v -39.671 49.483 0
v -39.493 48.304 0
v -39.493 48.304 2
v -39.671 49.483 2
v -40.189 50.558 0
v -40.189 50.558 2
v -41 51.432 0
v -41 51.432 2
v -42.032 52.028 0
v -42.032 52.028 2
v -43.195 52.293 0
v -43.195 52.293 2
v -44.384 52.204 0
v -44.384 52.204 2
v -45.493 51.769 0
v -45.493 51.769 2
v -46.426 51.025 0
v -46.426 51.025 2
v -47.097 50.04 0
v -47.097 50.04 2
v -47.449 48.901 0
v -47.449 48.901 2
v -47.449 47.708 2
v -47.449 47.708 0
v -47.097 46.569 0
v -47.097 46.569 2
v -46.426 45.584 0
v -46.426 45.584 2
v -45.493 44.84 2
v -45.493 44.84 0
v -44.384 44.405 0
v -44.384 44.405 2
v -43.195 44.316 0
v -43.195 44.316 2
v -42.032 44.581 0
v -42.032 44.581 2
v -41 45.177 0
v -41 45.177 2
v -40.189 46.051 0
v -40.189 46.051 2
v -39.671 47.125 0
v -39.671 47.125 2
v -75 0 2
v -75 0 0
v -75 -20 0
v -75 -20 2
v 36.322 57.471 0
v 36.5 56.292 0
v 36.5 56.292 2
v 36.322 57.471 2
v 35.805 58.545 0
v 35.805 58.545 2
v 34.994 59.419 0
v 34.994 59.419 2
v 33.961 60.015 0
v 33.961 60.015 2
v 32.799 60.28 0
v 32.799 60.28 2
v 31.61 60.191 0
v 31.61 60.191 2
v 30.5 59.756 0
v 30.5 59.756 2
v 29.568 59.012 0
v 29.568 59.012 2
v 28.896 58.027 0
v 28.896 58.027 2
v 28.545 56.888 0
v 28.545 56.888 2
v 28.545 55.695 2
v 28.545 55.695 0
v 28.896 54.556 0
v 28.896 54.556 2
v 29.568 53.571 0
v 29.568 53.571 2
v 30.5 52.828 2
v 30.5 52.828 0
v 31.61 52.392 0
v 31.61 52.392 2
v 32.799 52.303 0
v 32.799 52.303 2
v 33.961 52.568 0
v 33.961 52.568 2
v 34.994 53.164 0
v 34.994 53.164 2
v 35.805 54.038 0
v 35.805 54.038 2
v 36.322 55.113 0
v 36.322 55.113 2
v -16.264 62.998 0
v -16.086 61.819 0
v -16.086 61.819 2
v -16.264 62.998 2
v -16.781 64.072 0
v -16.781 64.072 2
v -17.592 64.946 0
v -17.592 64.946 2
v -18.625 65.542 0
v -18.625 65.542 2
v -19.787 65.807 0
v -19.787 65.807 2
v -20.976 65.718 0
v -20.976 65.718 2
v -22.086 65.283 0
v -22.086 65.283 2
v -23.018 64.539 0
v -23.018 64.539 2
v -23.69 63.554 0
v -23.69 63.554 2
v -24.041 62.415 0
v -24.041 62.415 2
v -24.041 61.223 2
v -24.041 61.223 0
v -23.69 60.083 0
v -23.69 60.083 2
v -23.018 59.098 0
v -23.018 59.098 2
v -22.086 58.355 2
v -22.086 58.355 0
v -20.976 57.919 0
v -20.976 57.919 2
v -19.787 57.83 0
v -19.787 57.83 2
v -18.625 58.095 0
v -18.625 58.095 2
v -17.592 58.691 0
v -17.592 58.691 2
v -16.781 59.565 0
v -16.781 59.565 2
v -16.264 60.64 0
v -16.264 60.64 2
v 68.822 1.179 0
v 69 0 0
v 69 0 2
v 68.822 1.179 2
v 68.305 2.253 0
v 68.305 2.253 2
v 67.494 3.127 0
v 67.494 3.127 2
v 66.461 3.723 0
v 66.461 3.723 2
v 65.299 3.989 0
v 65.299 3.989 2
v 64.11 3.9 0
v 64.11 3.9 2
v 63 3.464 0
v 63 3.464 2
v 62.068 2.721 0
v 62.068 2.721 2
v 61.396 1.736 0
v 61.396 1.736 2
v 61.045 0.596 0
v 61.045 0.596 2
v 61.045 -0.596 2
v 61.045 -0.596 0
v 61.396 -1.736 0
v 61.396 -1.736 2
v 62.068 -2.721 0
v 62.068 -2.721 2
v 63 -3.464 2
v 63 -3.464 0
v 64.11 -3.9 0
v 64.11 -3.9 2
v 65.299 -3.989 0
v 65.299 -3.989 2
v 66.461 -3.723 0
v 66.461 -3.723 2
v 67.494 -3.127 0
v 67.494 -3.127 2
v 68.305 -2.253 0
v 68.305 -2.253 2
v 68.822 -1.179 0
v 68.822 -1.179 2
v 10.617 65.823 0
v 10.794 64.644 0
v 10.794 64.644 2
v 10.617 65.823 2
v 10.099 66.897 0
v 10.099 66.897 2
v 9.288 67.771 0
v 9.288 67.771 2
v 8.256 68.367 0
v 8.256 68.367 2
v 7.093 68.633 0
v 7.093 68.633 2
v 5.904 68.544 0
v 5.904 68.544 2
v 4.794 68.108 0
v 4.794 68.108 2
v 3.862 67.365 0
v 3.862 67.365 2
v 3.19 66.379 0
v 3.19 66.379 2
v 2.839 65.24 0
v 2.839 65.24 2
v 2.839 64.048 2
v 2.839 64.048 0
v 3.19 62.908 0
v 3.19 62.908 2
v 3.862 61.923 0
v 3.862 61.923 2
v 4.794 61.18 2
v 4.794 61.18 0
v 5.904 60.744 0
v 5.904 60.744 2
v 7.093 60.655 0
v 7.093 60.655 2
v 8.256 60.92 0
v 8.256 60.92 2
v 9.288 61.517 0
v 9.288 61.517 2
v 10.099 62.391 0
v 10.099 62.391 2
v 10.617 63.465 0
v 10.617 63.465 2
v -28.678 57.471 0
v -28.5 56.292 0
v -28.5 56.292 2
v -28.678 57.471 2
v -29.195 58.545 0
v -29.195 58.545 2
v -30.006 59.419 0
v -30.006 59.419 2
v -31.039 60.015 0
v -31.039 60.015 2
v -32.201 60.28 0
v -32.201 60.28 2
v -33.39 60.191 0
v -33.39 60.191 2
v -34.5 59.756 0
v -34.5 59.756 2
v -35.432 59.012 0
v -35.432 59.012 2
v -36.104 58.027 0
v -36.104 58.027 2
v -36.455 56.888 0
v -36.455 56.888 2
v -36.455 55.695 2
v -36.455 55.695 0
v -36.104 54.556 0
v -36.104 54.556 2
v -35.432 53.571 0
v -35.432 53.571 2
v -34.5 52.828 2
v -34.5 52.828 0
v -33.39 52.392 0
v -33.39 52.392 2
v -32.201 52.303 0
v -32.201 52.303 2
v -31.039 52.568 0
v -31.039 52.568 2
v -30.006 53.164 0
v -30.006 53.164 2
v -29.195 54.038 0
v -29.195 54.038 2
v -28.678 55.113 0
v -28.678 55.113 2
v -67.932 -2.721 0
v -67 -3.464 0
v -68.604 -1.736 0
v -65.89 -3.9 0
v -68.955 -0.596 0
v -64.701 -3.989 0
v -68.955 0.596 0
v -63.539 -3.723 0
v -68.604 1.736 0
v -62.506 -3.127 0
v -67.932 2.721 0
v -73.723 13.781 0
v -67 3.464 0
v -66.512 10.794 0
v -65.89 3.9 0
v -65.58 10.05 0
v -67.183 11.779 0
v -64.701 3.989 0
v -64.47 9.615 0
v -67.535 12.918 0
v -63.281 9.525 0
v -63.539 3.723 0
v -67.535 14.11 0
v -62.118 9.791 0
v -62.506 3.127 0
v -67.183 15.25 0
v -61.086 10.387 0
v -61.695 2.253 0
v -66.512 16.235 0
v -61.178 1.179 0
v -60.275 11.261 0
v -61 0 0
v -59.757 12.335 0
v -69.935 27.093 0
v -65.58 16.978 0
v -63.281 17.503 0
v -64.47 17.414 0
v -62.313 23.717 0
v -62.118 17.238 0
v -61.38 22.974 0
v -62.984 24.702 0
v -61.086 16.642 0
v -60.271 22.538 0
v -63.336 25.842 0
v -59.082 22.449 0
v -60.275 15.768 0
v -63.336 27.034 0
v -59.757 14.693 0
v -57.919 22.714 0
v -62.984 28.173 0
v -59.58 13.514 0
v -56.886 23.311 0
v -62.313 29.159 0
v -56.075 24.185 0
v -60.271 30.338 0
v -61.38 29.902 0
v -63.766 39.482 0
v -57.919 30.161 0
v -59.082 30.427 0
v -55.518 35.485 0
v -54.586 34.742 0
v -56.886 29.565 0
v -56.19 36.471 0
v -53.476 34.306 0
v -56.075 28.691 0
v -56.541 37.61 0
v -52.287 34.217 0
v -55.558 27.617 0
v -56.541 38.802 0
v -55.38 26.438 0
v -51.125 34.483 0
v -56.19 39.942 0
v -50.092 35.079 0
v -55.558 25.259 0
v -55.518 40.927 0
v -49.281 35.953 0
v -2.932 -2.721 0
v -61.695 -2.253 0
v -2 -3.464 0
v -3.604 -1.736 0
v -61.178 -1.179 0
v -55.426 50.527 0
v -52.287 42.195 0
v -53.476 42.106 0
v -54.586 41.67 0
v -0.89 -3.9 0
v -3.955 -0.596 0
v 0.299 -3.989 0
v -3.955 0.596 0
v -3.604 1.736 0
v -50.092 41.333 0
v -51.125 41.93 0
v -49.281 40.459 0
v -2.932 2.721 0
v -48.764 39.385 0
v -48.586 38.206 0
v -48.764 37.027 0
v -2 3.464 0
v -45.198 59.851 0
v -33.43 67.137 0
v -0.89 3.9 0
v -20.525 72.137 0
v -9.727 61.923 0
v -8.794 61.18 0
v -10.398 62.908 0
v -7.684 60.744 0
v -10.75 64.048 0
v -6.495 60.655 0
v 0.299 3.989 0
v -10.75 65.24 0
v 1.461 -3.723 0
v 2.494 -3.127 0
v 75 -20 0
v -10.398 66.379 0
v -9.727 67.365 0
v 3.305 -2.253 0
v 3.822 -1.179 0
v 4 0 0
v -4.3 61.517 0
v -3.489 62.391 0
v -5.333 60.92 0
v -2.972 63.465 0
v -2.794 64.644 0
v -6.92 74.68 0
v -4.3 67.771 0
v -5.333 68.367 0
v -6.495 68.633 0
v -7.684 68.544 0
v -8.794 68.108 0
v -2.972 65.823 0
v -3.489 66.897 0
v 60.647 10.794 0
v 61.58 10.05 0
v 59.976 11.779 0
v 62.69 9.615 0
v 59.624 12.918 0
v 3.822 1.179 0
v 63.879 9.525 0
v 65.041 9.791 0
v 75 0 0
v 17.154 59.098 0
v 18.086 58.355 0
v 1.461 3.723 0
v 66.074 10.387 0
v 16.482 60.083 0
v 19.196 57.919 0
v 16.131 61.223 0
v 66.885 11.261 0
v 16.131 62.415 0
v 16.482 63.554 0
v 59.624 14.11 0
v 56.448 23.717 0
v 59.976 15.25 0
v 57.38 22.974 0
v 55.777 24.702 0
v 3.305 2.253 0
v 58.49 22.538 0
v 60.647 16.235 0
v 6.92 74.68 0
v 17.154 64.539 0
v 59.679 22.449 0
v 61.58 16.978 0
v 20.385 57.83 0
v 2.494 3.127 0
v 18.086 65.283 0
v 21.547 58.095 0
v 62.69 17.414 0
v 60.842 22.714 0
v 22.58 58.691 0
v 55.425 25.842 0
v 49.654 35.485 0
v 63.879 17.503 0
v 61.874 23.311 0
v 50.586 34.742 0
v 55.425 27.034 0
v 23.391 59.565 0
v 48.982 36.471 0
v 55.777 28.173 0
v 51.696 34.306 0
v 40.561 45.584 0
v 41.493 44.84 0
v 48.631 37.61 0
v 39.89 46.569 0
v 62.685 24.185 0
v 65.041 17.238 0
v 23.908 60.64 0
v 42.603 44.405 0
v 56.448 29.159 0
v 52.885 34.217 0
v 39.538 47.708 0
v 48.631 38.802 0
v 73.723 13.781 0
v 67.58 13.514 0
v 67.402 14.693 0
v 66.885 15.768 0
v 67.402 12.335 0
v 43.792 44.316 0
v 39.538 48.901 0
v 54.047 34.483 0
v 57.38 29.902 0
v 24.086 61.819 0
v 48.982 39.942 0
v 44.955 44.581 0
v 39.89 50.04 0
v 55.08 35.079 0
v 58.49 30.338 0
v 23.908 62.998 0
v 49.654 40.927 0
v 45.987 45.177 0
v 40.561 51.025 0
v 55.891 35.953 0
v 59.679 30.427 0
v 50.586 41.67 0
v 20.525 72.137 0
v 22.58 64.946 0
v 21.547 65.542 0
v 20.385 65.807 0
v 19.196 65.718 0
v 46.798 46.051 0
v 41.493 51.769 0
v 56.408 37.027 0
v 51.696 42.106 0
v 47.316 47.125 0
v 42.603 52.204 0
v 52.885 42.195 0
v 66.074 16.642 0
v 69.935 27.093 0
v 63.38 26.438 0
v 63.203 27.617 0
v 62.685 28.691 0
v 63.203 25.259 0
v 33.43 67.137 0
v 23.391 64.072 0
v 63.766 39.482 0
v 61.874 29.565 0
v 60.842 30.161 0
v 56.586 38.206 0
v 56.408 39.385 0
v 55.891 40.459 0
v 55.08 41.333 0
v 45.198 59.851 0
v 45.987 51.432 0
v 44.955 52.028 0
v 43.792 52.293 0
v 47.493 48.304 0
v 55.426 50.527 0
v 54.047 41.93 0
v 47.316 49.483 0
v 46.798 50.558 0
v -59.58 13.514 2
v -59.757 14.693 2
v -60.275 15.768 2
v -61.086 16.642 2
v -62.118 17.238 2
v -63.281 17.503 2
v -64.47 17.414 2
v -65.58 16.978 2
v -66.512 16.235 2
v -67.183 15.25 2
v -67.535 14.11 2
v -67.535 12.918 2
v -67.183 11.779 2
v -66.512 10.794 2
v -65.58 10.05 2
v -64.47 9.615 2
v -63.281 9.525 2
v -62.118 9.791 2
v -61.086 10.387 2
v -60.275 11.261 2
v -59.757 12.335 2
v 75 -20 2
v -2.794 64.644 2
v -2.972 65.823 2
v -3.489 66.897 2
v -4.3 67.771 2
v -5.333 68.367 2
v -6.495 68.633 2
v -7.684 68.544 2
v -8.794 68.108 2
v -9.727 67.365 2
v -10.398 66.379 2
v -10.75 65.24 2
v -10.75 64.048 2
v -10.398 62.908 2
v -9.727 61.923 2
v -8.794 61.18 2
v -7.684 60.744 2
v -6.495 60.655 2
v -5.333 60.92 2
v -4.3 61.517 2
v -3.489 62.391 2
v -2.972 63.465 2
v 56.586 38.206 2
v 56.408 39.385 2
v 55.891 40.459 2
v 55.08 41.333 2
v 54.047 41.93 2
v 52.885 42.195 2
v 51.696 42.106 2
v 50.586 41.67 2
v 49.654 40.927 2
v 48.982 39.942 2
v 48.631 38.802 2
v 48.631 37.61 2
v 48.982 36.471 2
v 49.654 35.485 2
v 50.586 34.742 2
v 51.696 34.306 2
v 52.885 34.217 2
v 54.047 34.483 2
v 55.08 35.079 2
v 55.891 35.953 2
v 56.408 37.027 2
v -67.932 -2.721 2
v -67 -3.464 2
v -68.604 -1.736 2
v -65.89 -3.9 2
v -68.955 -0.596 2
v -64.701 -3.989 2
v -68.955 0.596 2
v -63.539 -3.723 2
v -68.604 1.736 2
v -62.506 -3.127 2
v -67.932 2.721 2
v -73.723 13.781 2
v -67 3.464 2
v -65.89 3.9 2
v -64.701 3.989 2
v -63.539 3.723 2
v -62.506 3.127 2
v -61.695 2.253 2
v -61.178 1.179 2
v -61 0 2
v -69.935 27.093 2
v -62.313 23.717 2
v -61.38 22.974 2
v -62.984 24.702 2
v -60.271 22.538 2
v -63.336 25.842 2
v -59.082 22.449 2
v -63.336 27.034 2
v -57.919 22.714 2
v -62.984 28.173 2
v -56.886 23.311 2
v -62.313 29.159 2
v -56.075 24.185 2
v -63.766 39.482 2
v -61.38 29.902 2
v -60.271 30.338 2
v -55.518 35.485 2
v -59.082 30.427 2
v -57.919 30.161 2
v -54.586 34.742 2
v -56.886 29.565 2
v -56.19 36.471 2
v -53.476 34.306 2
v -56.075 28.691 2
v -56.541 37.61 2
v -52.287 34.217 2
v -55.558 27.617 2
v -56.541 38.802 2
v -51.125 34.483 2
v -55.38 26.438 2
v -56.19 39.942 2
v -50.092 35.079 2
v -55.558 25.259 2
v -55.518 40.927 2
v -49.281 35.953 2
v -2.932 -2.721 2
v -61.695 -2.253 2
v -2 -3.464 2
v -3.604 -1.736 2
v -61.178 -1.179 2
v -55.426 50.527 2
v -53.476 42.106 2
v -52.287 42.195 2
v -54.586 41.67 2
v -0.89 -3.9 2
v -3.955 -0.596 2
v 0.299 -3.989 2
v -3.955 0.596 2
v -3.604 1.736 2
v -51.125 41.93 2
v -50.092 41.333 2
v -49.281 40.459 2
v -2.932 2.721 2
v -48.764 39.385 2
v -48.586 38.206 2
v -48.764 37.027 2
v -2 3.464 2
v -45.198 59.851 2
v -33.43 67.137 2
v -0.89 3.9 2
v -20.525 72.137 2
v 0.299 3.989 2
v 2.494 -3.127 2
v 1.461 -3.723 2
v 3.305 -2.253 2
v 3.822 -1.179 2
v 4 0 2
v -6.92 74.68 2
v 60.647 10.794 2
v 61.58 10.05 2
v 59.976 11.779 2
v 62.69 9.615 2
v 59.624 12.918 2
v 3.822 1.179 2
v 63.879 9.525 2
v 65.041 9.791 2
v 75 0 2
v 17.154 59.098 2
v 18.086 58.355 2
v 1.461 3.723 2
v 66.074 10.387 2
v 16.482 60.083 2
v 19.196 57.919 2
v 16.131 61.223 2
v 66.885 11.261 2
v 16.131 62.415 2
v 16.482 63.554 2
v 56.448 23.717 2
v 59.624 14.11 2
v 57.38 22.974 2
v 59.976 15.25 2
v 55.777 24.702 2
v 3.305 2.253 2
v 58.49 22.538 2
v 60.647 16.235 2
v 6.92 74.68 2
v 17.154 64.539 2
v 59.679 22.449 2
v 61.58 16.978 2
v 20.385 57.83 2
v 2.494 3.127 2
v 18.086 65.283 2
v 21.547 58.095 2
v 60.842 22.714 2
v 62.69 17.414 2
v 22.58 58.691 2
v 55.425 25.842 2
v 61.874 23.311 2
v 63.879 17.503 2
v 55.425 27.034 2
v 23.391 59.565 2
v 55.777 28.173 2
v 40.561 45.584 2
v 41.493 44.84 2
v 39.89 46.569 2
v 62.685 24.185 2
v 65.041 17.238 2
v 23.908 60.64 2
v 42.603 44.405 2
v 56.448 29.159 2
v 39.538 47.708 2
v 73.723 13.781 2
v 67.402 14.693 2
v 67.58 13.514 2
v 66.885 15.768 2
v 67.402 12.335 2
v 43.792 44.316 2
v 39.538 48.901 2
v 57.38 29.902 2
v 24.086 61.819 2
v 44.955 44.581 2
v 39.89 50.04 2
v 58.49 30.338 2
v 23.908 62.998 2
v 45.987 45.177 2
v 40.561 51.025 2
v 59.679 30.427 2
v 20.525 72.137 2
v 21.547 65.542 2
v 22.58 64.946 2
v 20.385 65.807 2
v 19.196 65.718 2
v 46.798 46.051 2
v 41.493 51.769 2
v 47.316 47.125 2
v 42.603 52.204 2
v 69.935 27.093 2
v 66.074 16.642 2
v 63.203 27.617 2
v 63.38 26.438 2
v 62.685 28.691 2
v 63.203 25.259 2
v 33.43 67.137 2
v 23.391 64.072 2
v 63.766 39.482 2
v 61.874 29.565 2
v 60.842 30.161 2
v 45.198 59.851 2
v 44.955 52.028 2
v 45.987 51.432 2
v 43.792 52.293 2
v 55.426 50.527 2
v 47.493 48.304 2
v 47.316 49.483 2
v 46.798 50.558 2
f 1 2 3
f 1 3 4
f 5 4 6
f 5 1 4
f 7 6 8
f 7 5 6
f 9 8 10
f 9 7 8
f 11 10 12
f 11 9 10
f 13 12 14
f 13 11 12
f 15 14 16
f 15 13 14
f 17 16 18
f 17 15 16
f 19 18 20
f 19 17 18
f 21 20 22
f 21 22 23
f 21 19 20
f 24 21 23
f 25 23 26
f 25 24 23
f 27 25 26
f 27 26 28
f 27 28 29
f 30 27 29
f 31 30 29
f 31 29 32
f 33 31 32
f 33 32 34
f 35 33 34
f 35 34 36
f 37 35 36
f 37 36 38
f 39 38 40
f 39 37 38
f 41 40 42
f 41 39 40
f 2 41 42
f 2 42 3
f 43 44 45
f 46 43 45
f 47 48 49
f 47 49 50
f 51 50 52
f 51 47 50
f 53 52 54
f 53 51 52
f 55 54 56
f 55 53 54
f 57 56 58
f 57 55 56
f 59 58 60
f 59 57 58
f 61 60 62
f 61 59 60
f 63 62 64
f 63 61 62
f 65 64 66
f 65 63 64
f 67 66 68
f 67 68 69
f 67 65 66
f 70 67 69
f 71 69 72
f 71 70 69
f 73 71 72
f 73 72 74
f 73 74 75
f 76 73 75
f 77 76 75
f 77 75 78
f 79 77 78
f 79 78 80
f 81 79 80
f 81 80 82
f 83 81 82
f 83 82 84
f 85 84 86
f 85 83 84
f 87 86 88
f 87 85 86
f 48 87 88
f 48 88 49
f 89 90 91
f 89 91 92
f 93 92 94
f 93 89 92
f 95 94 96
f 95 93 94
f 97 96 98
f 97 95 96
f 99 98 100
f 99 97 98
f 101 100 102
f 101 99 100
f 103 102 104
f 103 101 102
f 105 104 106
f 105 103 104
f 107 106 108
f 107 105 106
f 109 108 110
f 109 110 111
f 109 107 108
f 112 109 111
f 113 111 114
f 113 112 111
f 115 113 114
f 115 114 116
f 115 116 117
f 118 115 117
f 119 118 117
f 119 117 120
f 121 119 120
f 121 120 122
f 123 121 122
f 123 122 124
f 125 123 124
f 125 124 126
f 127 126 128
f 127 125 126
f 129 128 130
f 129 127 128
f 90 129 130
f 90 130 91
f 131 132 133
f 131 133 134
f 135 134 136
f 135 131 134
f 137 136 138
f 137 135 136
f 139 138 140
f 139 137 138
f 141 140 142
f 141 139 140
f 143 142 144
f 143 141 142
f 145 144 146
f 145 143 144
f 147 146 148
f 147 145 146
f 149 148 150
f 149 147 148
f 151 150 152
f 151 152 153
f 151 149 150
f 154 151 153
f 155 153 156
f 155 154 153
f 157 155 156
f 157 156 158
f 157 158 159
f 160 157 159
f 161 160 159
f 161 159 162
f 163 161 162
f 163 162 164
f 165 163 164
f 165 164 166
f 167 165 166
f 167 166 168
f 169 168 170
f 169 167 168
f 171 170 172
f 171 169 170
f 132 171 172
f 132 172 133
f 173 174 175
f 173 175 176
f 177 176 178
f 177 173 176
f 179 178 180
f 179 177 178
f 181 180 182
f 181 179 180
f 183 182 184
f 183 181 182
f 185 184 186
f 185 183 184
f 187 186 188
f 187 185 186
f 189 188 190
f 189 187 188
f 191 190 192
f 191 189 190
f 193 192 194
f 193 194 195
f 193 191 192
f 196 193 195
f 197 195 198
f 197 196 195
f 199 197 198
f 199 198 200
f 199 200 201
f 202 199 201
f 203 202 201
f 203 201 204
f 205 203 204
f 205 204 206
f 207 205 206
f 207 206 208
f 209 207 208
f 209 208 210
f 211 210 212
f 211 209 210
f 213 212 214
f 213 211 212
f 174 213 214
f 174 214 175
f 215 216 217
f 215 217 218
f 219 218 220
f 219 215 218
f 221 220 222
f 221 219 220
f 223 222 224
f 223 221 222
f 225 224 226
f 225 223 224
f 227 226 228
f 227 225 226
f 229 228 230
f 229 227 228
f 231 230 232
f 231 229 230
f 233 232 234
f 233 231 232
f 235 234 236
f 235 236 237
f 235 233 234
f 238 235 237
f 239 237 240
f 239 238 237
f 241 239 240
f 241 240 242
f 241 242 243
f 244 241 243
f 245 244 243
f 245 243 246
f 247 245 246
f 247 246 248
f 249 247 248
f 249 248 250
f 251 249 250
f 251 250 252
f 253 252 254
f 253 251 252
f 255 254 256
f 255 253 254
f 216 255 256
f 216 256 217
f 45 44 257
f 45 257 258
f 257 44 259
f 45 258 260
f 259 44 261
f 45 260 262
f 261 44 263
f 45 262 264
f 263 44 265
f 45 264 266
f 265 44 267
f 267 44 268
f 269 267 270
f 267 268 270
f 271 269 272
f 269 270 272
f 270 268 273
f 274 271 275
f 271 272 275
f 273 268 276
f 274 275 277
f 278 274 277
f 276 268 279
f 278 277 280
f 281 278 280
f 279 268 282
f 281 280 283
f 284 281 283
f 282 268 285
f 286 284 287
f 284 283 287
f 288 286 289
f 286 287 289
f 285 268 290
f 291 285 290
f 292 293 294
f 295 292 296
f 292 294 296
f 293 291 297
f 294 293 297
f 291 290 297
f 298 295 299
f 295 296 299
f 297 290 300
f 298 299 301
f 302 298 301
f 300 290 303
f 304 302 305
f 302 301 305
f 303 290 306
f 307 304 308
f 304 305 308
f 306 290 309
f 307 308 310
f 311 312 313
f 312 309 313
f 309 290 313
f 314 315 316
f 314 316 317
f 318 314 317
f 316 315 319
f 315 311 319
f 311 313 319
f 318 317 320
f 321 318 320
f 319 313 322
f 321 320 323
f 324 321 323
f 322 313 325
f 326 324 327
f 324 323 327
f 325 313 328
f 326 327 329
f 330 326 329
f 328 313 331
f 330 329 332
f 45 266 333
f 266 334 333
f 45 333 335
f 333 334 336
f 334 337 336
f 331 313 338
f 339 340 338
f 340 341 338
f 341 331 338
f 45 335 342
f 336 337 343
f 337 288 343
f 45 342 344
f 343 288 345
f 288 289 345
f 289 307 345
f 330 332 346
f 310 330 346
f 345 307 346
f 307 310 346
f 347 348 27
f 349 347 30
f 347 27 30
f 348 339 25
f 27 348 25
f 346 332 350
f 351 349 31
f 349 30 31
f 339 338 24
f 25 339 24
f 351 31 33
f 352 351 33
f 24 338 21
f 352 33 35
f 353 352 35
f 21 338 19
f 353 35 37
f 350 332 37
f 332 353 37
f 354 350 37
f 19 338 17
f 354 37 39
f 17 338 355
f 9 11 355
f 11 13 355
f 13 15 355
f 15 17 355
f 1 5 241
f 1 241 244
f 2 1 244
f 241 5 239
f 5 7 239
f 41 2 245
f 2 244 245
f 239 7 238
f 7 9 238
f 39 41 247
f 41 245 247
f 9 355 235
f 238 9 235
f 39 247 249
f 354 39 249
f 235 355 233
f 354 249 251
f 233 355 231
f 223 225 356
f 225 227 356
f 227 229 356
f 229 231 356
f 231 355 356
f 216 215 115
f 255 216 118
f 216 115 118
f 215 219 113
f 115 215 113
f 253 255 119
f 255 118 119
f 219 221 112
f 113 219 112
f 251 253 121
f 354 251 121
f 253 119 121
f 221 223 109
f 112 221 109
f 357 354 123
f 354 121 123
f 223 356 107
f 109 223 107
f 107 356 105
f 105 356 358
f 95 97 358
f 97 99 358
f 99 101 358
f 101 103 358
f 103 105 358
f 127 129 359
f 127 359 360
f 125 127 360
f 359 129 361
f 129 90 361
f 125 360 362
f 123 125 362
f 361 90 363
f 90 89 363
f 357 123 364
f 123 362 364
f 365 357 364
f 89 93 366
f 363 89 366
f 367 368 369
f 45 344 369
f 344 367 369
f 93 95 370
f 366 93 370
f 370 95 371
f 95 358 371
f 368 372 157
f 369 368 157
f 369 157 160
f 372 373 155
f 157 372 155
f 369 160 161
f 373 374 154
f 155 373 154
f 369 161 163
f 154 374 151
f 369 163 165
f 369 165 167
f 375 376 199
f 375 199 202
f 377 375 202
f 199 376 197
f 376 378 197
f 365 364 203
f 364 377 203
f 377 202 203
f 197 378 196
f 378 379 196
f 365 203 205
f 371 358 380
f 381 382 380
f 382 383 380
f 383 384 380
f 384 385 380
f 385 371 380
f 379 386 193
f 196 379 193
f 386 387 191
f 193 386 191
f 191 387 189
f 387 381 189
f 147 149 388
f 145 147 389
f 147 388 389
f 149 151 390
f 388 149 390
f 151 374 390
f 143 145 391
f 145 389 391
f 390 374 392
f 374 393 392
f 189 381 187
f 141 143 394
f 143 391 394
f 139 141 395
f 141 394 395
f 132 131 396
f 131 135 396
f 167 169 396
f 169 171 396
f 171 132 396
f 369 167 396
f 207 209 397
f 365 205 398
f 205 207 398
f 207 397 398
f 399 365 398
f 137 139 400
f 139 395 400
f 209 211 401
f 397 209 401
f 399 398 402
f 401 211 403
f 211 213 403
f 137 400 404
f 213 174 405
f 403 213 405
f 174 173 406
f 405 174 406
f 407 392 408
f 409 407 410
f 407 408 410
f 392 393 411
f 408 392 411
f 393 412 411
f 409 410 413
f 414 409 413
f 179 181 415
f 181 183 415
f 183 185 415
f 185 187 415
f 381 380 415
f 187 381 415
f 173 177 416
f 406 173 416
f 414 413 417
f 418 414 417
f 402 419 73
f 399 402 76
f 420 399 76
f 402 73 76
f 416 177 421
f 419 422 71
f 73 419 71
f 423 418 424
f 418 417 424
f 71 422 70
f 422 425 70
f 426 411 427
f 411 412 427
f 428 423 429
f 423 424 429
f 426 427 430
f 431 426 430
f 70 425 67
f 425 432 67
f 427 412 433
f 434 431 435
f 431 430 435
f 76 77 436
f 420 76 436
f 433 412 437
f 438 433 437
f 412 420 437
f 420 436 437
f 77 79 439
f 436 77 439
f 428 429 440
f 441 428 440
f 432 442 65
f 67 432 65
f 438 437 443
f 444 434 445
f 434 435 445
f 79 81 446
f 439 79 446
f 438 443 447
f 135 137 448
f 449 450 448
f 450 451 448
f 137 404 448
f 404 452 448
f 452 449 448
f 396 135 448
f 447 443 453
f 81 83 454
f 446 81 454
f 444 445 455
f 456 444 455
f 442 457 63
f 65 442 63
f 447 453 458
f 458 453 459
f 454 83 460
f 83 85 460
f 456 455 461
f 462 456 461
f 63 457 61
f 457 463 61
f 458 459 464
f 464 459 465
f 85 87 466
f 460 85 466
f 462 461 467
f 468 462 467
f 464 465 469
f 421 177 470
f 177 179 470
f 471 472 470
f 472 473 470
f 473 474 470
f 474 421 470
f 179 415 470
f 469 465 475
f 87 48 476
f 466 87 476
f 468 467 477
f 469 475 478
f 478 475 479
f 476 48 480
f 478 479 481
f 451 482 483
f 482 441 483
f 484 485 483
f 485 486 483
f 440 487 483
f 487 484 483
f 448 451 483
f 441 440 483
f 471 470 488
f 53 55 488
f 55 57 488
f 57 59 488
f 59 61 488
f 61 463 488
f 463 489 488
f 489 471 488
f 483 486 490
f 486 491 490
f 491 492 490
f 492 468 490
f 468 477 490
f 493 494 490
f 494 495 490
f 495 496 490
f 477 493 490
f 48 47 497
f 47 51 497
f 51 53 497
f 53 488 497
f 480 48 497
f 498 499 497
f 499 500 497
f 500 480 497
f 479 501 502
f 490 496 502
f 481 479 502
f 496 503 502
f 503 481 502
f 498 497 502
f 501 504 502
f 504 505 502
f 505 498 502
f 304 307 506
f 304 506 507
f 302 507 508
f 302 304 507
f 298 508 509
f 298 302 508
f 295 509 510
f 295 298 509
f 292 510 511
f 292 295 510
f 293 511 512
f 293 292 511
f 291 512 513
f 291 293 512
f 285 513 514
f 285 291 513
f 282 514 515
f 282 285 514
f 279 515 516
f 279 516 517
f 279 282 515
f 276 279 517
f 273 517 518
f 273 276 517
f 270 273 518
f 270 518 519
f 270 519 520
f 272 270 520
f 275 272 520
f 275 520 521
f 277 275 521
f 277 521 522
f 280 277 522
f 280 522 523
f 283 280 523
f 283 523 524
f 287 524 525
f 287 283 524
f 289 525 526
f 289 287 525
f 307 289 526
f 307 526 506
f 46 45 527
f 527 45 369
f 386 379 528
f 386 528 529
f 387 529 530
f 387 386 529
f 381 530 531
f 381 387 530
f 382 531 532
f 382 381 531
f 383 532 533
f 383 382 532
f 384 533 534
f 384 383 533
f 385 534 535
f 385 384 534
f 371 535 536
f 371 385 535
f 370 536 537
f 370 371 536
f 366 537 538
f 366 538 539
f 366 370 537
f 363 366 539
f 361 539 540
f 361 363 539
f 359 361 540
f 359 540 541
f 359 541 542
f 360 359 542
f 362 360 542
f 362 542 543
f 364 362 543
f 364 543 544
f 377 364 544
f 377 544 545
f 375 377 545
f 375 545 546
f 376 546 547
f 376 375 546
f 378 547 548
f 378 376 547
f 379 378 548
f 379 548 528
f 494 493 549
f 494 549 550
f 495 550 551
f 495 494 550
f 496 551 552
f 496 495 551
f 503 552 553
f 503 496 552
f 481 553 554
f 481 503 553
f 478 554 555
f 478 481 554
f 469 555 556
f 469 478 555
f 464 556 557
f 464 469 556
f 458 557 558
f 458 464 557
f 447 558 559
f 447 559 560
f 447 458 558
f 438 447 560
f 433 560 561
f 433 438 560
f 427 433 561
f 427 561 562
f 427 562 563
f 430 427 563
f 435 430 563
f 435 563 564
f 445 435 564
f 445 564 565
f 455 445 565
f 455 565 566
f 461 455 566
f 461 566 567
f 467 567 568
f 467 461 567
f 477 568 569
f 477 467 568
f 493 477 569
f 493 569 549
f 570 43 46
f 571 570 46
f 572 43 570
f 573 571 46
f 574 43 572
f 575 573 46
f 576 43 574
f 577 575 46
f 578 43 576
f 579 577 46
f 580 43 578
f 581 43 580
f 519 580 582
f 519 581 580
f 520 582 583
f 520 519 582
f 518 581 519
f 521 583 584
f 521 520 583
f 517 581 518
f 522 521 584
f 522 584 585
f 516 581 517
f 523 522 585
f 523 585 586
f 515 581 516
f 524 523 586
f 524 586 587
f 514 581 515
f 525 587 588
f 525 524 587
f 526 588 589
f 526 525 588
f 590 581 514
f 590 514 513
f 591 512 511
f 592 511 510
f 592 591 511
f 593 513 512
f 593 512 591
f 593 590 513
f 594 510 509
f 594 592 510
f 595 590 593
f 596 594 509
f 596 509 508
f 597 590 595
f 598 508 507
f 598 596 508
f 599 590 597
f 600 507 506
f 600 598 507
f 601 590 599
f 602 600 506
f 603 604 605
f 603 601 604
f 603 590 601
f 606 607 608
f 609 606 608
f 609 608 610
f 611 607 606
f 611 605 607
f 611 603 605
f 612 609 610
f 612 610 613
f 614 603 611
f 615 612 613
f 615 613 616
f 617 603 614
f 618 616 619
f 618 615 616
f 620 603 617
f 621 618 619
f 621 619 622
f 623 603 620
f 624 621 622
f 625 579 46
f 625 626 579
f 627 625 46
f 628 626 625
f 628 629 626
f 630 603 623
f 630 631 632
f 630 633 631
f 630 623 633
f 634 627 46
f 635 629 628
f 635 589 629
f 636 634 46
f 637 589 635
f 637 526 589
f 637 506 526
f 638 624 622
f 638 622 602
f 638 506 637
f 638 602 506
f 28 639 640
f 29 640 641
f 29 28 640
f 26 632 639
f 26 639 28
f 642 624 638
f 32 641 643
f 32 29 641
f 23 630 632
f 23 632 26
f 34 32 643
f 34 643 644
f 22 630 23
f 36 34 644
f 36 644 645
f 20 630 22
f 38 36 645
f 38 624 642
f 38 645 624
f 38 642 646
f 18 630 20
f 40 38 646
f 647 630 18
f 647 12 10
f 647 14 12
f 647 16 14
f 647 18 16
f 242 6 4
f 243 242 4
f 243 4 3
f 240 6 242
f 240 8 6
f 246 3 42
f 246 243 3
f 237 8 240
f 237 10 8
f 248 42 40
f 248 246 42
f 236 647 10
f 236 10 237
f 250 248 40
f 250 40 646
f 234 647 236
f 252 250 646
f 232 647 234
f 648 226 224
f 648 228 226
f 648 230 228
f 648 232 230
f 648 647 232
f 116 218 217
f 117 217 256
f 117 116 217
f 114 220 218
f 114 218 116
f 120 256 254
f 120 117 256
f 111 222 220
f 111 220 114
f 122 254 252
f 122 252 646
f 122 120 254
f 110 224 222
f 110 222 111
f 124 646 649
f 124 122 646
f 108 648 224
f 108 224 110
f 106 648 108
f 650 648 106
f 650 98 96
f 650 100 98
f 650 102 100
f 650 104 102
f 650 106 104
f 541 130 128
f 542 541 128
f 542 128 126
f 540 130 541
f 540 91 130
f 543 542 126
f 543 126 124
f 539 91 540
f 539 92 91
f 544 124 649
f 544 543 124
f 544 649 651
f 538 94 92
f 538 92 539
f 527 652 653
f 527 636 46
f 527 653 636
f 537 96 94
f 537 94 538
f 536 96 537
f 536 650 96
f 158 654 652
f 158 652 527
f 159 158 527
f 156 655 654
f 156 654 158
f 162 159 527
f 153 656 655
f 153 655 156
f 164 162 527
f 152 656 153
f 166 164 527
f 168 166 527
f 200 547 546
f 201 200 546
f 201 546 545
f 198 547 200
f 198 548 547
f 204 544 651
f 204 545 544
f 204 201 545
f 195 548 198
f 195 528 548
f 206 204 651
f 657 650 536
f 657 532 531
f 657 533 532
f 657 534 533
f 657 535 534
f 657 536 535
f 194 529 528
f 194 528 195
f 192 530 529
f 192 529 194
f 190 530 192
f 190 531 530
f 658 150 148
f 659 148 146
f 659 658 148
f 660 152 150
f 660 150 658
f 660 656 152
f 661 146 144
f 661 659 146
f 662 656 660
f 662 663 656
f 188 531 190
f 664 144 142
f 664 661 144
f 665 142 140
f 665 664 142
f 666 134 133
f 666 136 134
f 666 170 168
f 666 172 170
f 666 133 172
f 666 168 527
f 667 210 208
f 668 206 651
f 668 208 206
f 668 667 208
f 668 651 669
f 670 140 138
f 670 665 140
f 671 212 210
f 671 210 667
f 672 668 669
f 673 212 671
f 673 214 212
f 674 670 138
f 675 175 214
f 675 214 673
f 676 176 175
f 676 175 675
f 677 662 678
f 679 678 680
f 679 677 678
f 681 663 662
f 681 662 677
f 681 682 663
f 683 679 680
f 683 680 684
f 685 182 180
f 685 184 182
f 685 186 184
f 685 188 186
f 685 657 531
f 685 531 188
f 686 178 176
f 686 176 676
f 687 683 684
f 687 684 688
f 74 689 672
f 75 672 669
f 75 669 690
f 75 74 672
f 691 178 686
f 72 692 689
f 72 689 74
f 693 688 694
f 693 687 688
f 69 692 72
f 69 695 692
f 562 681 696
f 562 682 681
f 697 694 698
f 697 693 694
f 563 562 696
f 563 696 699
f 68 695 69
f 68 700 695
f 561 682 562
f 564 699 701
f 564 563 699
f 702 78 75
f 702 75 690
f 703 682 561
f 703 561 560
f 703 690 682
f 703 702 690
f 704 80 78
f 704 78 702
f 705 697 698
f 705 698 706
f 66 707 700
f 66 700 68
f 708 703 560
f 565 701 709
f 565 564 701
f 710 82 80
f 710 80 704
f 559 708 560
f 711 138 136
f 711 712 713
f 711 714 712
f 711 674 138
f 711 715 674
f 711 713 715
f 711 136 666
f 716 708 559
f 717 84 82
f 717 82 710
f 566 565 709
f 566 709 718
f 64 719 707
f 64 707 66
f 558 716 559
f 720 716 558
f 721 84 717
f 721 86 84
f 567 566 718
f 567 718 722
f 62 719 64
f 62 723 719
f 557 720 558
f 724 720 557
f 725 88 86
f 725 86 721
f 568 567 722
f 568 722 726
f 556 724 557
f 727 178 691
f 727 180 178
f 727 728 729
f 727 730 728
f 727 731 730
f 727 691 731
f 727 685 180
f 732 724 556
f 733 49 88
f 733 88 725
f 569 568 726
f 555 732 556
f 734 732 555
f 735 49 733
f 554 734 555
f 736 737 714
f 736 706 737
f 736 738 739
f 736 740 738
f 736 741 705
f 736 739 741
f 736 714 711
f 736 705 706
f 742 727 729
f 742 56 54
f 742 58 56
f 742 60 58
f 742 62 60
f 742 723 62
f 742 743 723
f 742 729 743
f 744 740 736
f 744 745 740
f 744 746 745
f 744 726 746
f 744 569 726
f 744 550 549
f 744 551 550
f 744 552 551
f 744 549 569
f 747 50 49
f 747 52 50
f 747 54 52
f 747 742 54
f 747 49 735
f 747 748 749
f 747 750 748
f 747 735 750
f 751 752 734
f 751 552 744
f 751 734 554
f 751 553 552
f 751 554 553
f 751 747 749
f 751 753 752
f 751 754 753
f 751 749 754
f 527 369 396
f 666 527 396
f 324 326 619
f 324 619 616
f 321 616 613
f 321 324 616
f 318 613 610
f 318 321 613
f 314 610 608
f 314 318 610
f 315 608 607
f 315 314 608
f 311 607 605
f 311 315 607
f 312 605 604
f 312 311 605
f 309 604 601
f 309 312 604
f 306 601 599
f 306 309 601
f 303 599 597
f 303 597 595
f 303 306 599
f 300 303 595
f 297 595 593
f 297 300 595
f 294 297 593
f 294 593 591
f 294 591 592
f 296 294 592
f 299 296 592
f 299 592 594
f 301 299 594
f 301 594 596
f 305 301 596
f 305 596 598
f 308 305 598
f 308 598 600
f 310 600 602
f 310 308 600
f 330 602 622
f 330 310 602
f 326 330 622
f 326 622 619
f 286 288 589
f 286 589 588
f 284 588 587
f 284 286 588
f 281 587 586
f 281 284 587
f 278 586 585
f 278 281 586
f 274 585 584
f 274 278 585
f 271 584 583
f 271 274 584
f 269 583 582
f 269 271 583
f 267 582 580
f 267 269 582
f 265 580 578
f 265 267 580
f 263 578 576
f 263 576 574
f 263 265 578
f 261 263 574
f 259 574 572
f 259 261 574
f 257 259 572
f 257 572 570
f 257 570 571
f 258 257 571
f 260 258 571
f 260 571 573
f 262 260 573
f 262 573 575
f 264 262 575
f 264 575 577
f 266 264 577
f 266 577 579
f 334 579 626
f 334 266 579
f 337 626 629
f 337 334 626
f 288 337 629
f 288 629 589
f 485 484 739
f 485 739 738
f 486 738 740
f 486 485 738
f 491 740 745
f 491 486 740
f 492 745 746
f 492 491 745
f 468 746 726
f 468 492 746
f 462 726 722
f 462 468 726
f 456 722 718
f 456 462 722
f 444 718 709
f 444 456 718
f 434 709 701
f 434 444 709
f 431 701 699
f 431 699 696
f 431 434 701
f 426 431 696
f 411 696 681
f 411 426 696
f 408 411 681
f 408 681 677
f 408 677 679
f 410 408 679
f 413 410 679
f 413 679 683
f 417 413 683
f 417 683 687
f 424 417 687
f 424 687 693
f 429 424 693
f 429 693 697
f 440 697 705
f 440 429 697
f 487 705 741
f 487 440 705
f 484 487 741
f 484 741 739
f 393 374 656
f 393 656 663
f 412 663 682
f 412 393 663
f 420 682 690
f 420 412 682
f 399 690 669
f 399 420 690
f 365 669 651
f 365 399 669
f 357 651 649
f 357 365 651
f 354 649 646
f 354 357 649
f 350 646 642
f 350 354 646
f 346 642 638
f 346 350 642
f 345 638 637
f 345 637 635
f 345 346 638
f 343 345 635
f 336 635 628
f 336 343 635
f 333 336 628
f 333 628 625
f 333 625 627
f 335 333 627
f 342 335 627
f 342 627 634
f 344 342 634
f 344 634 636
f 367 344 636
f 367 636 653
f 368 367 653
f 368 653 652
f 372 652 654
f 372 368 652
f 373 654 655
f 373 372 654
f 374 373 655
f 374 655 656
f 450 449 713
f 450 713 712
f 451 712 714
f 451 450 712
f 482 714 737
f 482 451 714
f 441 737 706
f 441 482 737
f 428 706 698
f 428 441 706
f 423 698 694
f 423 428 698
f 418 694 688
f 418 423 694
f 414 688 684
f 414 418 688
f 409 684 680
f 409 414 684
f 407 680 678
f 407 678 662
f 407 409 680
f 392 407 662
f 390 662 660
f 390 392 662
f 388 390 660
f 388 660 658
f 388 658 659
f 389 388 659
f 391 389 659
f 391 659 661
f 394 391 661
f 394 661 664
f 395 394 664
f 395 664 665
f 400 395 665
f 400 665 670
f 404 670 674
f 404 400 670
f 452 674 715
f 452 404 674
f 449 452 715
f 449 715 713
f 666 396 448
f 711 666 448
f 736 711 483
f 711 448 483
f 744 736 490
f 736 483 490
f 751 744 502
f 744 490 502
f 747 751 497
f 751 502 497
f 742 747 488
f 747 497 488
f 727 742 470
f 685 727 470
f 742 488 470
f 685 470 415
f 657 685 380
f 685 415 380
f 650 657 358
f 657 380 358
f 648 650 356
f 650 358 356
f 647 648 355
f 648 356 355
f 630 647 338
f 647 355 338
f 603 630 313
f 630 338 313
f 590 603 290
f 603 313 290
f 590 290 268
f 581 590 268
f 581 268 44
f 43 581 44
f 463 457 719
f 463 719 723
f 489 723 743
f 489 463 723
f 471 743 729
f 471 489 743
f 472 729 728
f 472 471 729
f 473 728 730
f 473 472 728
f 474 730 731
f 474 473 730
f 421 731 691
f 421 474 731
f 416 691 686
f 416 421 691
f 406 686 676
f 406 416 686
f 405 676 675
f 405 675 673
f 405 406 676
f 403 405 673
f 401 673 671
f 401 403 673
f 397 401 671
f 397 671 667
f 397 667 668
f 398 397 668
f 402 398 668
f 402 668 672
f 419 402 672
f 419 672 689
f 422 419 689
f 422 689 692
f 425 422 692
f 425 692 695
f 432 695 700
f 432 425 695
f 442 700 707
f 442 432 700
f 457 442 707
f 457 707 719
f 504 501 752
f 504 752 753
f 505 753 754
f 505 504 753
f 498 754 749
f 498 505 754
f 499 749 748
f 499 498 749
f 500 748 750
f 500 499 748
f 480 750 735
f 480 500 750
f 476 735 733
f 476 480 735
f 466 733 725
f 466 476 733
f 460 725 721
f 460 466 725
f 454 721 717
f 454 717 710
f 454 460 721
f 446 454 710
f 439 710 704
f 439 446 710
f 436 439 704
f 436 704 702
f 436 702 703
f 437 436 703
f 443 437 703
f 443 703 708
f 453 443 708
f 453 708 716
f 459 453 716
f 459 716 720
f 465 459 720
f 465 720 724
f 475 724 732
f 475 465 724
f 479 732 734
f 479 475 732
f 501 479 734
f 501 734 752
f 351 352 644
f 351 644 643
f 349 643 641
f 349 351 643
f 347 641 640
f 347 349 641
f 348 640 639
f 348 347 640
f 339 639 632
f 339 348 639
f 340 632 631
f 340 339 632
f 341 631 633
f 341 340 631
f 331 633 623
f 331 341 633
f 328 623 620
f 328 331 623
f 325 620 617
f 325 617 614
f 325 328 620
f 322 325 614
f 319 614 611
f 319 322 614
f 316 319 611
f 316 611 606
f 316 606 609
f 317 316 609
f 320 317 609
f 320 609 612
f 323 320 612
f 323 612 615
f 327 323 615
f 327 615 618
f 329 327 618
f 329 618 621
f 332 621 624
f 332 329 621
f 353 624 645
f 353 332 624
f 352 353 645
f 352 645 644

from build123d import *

# Parameters (mm, degrees)
SKETCH1_R           = 4
BOSS_EXTRUDE1_DEPTH = 2


with BuildPart() as part:
    # Sketch1 → Boss-Extrude1 (new body)
    with BuildSketch(Plane.XY):
        with BuildLine():
            Line((-75, 0), (-75, -20))
            Line((-75, -20), (75, -20))
            Line((75, -20), (75, 0))
            ThreePointArc((75, 0), (0, 75), (-75, 0))
        make_face()
        with Locations((-65, 0)):
            Circle(SKETCH1_R, mode=Mode.SUBTRACT)
        Circle(SKETCH1_R, mode=Mode.SUBTRACT)
        with Locations((-63.579594048, 13.514259903)):
            Circle(SKETCH1_R, mode=Mode.SUBTRACT)
        with Locations((-59.380454747, 26.4378818)):
            Circle(SKETCH1_R, mode=Mode.SUBTRACT)
        with Locations((-52.586104634, 38.206041399)):
            Circle(SKETCH1_R, mode=Mode.SUBTRACT)
        with Locations((-43.493489413, 48.304413656)):
            Circle(SKETCH1_R, mode=Mode.SUBTRACT)
        with Locations((-32.5, 56.291651246)):
            Circle(SKETCH1_R, mode=Mode.SUBTRACT)
        with Locations((-20.086104634, 61.818673559)):
            Circle(SKETCH1_R, mode=Mode.SUBTRACT)
        with Locations((-6.794350112, 64.643923199)):
            Circle(SKETCH1_R, mode=Mode.SUBTRACT)
        with Locations((6.794350112, 64.643923199)):
            Circle(SKETCH1_R, mode=Mode.SUBTRACT)
        with Locations((20.086104634, 61.818673559)):
            Circle(SKETCH1_R, mode=Mode.SUBTRACT)
        with Locations((32.5, 56.291651246)):
            Circle(SKETCH1_R, mode=Mode.SUBTRACT)
        with Locations((43.493489413, 48.304413656)):
            Circle(SKETCH1_R, mode=Mode.SUBTRACT)
        with Locations((52.586104634, 38.206041399)):
            Circle(SKETCH1_R, mode=Mode.SUBTRACT)
        with Locations((59.380454747, 26.4378818)):
            Circle(SKETCH1_R, mode=Mode.SUBTRACT)
        with Locations((63.579594048, 13.514259903)):
            Circle(SKETCH1_R, mode=Mode.SUBTRACT)
        with Locations((65, 0)):
            Circle(SKETCH1_R, mode=Mode.SUBTRACT)
    extrude(amount=BOSS_EXTRUDE1_DEPTH)


solid = part.part
